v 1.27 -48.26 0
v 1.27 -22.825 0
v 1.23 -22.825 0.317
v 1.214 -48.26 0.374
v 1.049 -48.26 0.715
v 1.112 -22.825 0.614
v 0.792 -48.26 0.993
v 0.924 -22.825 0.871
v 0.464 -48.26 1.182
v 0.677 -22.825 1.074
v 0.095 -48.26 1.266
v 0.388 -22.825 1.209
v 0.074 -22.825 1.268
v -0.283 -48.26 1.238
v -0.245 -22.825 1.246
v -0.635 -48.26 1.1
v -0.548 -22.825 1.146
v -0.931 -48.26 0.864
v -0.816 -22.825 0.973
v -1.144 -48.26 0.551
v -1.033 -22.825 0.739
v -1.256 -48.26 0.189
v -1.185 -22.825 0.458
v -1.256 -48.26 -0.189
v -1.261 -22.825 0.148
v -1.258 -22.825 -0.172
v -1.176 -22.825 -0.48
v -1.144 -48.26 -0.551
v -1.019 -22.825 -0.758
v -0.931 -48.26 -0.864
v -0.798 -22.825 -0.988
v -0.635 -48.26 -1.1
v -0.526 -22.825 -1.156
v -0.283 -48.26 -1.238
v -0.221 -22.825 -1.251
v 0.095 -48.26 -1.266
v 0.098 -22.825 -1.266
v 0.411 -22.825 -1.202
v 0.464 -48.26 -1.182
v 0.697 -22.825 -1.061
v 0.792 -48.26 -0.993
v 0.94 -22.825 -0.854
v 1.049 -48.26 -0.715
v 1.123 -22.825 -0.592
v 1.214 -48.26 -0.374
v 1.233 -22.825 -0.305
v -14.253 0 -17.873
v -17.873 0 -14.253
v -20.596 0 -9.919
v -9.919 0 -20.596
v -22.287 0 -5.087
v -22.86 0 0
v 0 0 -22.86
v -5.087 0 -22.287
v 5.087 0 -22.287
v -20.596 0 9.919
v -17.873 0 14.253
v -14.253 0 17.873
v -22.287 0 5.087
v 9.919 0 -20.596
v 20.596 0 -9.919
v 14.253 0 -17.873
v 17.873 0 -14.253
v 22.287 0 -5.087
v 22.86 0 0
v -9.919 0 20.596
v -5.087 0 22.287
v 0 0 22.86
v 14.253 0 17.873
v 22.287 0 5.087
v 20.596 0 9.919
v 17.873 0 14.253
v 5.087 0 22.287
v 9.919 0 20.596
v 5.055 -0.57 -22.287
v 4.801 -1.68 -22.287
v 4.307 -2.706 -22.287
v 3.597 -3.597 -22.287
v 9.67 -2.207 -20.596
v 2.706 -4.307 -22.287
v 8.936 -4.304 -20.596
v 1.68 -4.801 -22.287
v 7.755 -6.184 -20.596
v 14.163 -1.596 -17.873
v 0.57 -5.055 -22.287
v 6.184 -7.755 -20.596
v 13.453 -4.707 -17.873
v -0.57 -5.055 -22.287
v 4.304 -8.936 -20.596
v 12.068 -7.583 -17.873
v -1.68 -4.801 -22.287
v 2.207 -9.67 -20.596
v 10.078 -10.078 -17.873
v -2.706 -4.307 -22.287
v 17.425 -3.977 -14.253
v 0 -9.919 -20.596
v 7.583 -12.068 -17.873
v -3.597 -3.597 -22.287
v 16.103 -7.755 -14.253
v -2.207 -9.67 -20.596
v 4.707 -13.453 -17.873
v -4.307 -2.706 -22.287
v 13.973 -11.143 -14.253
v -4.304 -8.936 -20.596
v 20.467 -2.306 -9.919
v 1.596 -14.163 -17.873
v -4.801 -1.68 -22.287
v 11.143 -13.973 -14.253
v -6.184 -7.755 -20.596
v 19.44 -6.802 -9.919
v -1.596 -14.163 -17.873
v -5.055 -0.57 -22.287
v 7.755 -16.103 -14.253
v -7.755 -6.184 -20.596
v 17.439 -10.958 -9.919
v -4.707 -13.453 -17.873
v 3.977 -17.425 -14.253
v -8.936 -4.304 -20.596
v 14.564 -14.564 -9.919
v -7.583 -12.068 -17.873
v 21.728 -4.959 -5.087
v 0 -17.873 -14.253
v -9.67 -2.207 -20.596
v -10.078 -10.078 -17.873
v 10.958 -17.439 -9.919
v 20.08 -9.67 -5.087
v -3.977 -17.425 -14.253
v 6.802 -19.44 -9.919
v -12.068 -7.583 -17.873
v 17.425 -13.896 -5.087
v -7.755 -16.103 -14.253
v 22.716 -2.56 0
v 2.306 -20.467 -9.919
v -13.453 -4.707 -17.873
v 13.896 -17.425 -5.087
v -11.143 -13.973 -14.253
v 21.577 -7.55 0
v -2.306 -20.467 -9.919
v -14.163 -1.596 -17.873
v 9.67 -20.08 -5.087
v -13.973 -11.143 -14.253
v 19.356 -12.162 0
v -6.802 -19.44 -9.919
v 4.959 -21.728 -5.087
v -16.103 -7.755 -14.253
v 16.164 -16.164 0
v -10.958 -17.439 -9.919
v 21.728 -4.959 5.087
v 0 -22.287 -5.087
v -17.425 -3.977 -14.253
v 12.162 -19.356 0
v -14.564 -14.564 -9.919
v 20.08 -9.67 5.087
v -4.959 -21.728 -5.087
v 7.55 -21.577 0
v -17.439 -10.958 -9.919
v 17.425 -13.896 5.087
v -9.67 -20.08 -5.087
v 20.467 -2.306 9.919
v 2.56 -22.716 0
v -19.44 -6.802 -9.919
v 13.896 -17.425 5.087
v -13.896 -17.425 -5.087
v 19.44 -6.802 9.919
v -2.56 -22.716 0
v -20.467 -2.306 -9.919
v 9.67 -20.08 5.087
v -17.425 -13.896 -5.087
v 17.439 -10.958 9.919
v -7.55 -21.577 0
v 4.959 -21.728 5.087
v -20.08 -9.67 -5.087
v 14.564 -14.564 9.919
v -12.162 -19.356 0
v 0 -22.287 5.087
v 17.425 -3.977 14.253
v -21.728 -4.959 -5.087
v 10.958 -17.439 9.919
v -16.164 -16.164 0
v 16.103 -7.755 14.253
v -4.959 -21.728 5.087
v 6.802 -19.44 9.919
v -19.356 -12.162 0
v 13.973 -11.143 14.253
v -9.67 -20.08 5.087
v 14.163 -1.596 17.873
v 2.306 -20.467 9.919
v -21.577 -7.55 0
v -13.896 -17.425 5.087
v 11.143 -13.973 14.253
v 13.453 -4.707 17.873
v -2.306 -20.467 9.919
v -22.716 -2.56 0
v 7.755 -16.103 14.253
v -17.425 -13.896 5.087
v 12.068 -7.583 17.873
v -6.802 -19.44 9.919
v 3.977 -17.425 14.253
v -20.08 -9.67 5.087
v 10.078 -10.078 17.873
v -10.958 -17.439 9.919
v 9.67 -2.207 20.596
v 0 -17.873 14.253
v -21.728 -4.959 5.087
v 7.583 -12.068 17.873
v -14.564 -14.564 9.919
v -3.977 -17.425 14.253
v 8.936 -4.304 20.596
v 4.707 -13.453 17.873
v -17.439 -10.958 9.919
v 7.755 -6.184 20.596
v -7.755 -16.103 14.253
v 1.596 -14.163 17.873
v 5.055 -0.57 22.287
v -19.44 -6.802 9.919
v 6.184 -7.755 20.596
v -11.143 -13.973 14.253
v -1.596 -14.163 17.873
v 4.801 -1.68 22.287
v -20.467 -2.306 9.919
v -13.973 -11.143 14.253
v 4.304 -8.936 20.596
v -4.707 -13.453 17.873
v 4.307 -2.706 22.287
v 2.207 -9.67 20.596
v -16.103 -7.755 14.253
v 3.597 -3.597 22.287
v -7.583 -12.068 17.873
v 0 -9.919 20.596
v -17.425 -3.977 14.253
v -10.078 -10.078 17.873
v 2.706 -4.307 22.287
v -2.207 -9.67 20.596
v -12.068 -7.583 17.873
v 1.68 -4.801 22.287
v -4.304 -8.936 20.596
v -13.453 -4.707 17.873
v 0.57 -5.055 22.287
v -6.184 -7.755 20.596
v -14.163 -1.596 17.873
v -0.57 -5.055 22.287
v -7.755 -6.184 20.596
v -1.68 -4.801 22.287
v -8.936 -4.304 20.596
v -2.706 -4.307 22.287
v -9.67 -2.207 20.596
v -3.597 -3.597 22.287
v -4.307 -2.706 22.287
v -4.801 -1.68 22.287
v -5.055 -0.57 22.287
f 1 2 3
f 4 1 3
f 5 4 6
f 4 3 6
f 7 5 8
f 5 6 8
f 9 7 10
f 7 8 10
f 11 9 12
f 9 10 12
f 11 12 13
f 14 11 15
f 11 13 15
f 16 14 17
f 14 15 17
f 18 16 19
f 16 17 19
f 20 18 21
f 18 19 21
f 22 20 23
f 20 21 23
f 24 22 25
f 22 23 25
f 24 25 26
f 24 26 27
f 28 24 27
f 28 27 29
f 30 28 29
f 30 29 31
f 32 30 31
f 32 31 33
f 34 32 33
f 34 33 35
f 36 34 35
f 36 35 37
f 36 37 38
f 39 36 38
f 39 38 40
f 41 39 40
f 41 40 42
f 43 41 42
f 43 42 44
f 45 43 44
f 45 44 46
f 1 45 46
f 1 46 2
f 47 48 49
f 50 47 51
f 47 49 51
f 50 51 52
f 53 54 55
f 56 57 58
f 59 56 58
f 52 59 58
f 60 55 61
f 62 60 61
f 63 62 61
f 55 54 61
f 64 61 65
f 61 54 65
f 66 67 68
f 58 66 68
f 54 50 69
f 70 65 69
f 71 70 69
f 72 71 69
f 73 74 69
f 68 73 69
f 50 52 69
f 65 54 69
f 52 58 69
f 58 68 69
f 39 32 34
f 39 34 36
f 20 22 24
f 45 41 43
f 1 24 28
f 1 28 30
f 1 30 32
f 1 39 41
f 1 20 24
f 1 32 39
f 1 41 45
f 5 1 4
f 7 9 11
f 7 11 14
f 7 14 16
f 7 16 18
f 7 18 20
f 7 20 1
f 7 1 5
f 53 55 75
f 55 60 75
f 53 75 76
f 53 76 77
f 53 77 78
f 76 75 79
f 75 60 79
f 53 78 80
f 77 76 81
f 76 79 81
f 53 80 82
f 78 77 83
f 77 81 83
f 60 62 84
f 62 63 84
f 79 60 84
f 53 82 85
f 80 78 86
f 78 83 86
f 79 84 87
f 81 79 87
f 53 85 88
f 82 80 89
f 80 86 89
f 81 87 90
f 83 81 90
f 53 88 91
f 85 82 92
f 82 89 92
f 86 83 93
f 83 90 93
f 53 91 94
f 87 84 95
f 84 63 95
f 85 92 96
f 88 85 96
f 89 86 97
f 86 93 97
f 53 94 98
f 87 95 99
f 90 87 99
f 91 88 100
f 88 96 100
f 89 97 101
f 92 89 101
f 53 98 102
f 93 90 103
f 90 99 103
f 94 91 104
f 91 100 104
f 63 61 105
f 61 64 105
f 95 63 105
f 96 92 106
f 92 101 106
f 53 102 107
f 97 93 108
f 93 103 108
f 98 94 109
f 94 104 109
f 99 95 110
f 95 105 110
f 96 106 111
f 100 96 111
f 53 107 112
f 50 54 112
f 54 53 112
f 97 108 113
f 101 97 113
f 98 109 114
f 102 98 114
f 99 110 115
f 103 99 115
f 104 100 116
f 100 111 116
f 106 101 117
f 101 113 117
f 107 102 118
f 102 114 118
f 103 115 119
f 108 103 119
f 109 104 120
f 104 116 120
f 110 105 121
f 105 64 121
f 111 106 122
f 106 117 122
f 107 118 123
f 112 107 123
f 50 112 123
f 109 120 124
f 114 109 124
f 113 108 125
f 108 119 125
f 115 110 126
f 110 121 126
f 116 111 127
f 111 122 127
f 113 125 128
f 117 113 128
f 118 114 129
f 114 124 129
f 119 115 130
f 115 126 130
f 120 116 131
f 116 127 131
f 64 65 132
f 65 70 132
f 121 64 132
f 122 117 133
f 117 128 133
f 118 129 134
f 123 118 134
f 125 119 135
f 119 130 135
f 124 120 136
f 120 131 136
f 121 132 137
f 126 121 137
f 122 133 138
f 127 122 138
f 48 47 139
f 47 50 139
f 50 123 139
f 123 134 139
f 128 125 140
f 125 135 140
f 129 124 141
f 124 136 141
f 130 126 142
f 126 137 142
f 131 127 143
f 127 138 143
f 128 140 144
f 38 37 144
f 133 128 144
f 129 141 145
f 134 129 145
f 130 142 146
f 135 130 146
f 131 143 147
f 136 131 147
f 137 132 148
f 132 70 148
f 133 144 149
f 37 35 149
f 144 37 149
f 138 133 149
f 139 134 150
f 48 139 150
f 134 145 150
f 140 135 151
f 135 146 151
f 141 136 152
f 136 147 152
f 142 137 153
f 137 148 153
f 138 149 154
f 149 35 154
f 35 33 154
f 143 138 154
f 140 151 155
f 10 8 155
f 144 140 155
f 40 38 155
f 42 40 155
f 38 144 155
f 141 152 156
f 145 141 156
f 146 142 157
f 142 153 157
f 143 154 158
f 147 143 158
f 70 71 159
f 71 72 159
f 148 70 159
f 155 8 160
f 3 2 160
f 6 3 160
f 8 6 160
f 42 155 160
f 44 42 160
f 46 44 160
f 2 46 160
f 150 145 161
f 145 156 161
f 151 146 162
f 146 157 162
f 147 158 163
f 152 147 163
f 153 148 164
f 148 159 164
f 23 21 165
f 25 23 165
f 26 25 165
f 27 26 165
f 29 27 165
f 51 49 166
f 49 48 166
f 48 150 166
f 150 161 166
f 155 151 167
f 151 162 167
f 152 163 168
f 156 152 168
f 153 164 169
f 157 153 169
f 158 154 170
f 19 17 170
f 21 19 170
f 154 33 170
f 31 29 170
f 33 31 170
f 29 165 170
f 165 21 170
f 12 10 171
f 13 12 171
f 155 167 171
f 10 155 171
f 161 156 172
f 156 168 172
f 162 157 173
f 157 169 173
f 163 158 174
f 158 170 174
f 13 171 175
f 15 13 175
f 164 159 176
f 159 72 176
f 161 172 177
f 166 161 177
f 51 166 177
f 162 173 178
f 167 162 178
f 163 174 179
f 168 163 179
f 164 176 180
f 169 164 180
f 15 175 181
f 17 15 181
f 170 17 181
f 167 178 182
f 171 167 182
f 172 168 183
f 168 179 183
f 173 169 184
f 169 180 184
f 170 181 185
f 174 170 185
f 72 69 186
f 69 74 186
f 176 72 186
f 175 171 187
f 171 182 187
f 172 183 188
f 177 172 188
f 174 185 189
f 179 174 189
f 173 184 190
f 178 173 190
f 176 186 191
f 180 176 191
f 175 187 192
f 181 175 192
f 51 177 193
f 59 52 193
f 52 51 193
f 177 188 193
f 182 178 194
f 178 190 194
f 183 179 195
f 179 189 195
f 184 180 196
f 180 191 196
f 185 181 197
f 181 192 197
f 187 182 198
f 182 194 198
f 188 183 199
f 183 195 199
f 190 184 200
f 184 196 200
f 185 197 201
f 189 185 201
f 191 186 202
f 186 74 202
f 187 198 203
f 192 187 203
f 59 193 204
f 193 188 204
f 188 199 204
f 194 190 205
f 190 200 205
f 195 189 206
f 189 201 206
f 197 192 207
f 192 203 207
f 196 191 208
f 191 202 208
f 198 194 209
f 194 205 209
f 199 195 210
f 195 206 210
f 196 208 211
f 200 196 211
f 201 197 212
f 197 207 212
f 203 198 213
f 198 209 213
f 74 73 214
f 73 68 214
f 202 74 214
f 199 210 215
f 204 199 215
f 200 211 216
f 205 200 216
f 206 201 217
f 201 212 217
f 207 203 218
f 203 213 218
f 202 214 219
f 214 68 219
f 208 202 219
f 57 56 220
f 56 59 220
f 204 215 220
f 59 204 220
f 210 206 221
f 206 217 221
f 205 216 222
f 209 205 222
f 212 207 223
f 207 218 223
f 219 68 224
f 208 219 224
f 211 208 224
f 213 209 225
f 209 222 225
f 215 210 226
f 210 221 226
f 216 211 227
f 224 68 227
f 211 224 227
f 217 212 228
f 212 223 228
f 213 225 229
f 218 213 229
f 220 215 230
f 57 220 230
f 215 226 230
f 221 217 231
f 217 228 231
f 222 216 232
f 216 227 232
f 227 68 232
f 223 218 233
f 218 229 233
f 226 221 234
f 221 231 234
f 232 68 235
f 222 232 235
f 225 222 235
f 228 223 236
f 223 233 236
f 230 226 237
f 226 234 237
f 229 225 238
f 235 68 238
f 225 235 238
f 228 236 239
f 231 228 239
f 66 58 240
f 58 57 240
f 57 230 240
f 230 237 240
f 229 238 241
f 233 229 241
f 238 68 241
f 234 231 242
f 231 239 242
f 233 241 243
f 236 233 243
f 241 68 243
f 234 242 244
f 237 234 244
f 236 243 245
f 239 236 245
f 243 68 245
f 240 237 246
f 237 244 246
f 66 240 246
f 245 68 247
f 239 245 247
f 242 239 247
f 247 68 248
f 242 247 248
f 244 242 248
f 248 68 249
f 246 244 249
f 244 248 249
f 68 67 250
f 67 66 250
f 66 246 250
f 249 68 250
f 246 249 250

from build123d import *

# Parameters (mm, degrees)
F2_R          = 1.27
F3_DEPTH      = 48.26
F3_DEPTH_BACK = 48.26
F4_R          = 26.181924
F5_DEPTH      = 48.261


with BuildPart() as f1:
    # F0 (on Front) → F1 (revolve)
    with BuildSketch(Plane.XZ):
        with BuildLine():
            Line((0, 22.86), (0, -22.86))
            ThreePointArc((0, -22.86), (22.86, 0), (0, 22.86))
        make_face()
    revolve(axis=Axis((0, 0, 0), (0, 0, -1)))

    # F2 (on Front) → F3 (join, two sides)
    with BuildSketch(Plane.XZ) as f3_sk:
        Circle(F2_R)
    extrude(amount=F3_DEPTH)
    extrude(f3_sk.sketch, amount=-F3_DEPTH_BACK)

    # F4 (on Front) → F5 (cut, through all)
    with BuildSketch(Plane.XZ):
        Circle(F4_R)
    extrude(amount=-F5_DEPTH, mode=Mode.SUBTRACT)


solid = f1.part
